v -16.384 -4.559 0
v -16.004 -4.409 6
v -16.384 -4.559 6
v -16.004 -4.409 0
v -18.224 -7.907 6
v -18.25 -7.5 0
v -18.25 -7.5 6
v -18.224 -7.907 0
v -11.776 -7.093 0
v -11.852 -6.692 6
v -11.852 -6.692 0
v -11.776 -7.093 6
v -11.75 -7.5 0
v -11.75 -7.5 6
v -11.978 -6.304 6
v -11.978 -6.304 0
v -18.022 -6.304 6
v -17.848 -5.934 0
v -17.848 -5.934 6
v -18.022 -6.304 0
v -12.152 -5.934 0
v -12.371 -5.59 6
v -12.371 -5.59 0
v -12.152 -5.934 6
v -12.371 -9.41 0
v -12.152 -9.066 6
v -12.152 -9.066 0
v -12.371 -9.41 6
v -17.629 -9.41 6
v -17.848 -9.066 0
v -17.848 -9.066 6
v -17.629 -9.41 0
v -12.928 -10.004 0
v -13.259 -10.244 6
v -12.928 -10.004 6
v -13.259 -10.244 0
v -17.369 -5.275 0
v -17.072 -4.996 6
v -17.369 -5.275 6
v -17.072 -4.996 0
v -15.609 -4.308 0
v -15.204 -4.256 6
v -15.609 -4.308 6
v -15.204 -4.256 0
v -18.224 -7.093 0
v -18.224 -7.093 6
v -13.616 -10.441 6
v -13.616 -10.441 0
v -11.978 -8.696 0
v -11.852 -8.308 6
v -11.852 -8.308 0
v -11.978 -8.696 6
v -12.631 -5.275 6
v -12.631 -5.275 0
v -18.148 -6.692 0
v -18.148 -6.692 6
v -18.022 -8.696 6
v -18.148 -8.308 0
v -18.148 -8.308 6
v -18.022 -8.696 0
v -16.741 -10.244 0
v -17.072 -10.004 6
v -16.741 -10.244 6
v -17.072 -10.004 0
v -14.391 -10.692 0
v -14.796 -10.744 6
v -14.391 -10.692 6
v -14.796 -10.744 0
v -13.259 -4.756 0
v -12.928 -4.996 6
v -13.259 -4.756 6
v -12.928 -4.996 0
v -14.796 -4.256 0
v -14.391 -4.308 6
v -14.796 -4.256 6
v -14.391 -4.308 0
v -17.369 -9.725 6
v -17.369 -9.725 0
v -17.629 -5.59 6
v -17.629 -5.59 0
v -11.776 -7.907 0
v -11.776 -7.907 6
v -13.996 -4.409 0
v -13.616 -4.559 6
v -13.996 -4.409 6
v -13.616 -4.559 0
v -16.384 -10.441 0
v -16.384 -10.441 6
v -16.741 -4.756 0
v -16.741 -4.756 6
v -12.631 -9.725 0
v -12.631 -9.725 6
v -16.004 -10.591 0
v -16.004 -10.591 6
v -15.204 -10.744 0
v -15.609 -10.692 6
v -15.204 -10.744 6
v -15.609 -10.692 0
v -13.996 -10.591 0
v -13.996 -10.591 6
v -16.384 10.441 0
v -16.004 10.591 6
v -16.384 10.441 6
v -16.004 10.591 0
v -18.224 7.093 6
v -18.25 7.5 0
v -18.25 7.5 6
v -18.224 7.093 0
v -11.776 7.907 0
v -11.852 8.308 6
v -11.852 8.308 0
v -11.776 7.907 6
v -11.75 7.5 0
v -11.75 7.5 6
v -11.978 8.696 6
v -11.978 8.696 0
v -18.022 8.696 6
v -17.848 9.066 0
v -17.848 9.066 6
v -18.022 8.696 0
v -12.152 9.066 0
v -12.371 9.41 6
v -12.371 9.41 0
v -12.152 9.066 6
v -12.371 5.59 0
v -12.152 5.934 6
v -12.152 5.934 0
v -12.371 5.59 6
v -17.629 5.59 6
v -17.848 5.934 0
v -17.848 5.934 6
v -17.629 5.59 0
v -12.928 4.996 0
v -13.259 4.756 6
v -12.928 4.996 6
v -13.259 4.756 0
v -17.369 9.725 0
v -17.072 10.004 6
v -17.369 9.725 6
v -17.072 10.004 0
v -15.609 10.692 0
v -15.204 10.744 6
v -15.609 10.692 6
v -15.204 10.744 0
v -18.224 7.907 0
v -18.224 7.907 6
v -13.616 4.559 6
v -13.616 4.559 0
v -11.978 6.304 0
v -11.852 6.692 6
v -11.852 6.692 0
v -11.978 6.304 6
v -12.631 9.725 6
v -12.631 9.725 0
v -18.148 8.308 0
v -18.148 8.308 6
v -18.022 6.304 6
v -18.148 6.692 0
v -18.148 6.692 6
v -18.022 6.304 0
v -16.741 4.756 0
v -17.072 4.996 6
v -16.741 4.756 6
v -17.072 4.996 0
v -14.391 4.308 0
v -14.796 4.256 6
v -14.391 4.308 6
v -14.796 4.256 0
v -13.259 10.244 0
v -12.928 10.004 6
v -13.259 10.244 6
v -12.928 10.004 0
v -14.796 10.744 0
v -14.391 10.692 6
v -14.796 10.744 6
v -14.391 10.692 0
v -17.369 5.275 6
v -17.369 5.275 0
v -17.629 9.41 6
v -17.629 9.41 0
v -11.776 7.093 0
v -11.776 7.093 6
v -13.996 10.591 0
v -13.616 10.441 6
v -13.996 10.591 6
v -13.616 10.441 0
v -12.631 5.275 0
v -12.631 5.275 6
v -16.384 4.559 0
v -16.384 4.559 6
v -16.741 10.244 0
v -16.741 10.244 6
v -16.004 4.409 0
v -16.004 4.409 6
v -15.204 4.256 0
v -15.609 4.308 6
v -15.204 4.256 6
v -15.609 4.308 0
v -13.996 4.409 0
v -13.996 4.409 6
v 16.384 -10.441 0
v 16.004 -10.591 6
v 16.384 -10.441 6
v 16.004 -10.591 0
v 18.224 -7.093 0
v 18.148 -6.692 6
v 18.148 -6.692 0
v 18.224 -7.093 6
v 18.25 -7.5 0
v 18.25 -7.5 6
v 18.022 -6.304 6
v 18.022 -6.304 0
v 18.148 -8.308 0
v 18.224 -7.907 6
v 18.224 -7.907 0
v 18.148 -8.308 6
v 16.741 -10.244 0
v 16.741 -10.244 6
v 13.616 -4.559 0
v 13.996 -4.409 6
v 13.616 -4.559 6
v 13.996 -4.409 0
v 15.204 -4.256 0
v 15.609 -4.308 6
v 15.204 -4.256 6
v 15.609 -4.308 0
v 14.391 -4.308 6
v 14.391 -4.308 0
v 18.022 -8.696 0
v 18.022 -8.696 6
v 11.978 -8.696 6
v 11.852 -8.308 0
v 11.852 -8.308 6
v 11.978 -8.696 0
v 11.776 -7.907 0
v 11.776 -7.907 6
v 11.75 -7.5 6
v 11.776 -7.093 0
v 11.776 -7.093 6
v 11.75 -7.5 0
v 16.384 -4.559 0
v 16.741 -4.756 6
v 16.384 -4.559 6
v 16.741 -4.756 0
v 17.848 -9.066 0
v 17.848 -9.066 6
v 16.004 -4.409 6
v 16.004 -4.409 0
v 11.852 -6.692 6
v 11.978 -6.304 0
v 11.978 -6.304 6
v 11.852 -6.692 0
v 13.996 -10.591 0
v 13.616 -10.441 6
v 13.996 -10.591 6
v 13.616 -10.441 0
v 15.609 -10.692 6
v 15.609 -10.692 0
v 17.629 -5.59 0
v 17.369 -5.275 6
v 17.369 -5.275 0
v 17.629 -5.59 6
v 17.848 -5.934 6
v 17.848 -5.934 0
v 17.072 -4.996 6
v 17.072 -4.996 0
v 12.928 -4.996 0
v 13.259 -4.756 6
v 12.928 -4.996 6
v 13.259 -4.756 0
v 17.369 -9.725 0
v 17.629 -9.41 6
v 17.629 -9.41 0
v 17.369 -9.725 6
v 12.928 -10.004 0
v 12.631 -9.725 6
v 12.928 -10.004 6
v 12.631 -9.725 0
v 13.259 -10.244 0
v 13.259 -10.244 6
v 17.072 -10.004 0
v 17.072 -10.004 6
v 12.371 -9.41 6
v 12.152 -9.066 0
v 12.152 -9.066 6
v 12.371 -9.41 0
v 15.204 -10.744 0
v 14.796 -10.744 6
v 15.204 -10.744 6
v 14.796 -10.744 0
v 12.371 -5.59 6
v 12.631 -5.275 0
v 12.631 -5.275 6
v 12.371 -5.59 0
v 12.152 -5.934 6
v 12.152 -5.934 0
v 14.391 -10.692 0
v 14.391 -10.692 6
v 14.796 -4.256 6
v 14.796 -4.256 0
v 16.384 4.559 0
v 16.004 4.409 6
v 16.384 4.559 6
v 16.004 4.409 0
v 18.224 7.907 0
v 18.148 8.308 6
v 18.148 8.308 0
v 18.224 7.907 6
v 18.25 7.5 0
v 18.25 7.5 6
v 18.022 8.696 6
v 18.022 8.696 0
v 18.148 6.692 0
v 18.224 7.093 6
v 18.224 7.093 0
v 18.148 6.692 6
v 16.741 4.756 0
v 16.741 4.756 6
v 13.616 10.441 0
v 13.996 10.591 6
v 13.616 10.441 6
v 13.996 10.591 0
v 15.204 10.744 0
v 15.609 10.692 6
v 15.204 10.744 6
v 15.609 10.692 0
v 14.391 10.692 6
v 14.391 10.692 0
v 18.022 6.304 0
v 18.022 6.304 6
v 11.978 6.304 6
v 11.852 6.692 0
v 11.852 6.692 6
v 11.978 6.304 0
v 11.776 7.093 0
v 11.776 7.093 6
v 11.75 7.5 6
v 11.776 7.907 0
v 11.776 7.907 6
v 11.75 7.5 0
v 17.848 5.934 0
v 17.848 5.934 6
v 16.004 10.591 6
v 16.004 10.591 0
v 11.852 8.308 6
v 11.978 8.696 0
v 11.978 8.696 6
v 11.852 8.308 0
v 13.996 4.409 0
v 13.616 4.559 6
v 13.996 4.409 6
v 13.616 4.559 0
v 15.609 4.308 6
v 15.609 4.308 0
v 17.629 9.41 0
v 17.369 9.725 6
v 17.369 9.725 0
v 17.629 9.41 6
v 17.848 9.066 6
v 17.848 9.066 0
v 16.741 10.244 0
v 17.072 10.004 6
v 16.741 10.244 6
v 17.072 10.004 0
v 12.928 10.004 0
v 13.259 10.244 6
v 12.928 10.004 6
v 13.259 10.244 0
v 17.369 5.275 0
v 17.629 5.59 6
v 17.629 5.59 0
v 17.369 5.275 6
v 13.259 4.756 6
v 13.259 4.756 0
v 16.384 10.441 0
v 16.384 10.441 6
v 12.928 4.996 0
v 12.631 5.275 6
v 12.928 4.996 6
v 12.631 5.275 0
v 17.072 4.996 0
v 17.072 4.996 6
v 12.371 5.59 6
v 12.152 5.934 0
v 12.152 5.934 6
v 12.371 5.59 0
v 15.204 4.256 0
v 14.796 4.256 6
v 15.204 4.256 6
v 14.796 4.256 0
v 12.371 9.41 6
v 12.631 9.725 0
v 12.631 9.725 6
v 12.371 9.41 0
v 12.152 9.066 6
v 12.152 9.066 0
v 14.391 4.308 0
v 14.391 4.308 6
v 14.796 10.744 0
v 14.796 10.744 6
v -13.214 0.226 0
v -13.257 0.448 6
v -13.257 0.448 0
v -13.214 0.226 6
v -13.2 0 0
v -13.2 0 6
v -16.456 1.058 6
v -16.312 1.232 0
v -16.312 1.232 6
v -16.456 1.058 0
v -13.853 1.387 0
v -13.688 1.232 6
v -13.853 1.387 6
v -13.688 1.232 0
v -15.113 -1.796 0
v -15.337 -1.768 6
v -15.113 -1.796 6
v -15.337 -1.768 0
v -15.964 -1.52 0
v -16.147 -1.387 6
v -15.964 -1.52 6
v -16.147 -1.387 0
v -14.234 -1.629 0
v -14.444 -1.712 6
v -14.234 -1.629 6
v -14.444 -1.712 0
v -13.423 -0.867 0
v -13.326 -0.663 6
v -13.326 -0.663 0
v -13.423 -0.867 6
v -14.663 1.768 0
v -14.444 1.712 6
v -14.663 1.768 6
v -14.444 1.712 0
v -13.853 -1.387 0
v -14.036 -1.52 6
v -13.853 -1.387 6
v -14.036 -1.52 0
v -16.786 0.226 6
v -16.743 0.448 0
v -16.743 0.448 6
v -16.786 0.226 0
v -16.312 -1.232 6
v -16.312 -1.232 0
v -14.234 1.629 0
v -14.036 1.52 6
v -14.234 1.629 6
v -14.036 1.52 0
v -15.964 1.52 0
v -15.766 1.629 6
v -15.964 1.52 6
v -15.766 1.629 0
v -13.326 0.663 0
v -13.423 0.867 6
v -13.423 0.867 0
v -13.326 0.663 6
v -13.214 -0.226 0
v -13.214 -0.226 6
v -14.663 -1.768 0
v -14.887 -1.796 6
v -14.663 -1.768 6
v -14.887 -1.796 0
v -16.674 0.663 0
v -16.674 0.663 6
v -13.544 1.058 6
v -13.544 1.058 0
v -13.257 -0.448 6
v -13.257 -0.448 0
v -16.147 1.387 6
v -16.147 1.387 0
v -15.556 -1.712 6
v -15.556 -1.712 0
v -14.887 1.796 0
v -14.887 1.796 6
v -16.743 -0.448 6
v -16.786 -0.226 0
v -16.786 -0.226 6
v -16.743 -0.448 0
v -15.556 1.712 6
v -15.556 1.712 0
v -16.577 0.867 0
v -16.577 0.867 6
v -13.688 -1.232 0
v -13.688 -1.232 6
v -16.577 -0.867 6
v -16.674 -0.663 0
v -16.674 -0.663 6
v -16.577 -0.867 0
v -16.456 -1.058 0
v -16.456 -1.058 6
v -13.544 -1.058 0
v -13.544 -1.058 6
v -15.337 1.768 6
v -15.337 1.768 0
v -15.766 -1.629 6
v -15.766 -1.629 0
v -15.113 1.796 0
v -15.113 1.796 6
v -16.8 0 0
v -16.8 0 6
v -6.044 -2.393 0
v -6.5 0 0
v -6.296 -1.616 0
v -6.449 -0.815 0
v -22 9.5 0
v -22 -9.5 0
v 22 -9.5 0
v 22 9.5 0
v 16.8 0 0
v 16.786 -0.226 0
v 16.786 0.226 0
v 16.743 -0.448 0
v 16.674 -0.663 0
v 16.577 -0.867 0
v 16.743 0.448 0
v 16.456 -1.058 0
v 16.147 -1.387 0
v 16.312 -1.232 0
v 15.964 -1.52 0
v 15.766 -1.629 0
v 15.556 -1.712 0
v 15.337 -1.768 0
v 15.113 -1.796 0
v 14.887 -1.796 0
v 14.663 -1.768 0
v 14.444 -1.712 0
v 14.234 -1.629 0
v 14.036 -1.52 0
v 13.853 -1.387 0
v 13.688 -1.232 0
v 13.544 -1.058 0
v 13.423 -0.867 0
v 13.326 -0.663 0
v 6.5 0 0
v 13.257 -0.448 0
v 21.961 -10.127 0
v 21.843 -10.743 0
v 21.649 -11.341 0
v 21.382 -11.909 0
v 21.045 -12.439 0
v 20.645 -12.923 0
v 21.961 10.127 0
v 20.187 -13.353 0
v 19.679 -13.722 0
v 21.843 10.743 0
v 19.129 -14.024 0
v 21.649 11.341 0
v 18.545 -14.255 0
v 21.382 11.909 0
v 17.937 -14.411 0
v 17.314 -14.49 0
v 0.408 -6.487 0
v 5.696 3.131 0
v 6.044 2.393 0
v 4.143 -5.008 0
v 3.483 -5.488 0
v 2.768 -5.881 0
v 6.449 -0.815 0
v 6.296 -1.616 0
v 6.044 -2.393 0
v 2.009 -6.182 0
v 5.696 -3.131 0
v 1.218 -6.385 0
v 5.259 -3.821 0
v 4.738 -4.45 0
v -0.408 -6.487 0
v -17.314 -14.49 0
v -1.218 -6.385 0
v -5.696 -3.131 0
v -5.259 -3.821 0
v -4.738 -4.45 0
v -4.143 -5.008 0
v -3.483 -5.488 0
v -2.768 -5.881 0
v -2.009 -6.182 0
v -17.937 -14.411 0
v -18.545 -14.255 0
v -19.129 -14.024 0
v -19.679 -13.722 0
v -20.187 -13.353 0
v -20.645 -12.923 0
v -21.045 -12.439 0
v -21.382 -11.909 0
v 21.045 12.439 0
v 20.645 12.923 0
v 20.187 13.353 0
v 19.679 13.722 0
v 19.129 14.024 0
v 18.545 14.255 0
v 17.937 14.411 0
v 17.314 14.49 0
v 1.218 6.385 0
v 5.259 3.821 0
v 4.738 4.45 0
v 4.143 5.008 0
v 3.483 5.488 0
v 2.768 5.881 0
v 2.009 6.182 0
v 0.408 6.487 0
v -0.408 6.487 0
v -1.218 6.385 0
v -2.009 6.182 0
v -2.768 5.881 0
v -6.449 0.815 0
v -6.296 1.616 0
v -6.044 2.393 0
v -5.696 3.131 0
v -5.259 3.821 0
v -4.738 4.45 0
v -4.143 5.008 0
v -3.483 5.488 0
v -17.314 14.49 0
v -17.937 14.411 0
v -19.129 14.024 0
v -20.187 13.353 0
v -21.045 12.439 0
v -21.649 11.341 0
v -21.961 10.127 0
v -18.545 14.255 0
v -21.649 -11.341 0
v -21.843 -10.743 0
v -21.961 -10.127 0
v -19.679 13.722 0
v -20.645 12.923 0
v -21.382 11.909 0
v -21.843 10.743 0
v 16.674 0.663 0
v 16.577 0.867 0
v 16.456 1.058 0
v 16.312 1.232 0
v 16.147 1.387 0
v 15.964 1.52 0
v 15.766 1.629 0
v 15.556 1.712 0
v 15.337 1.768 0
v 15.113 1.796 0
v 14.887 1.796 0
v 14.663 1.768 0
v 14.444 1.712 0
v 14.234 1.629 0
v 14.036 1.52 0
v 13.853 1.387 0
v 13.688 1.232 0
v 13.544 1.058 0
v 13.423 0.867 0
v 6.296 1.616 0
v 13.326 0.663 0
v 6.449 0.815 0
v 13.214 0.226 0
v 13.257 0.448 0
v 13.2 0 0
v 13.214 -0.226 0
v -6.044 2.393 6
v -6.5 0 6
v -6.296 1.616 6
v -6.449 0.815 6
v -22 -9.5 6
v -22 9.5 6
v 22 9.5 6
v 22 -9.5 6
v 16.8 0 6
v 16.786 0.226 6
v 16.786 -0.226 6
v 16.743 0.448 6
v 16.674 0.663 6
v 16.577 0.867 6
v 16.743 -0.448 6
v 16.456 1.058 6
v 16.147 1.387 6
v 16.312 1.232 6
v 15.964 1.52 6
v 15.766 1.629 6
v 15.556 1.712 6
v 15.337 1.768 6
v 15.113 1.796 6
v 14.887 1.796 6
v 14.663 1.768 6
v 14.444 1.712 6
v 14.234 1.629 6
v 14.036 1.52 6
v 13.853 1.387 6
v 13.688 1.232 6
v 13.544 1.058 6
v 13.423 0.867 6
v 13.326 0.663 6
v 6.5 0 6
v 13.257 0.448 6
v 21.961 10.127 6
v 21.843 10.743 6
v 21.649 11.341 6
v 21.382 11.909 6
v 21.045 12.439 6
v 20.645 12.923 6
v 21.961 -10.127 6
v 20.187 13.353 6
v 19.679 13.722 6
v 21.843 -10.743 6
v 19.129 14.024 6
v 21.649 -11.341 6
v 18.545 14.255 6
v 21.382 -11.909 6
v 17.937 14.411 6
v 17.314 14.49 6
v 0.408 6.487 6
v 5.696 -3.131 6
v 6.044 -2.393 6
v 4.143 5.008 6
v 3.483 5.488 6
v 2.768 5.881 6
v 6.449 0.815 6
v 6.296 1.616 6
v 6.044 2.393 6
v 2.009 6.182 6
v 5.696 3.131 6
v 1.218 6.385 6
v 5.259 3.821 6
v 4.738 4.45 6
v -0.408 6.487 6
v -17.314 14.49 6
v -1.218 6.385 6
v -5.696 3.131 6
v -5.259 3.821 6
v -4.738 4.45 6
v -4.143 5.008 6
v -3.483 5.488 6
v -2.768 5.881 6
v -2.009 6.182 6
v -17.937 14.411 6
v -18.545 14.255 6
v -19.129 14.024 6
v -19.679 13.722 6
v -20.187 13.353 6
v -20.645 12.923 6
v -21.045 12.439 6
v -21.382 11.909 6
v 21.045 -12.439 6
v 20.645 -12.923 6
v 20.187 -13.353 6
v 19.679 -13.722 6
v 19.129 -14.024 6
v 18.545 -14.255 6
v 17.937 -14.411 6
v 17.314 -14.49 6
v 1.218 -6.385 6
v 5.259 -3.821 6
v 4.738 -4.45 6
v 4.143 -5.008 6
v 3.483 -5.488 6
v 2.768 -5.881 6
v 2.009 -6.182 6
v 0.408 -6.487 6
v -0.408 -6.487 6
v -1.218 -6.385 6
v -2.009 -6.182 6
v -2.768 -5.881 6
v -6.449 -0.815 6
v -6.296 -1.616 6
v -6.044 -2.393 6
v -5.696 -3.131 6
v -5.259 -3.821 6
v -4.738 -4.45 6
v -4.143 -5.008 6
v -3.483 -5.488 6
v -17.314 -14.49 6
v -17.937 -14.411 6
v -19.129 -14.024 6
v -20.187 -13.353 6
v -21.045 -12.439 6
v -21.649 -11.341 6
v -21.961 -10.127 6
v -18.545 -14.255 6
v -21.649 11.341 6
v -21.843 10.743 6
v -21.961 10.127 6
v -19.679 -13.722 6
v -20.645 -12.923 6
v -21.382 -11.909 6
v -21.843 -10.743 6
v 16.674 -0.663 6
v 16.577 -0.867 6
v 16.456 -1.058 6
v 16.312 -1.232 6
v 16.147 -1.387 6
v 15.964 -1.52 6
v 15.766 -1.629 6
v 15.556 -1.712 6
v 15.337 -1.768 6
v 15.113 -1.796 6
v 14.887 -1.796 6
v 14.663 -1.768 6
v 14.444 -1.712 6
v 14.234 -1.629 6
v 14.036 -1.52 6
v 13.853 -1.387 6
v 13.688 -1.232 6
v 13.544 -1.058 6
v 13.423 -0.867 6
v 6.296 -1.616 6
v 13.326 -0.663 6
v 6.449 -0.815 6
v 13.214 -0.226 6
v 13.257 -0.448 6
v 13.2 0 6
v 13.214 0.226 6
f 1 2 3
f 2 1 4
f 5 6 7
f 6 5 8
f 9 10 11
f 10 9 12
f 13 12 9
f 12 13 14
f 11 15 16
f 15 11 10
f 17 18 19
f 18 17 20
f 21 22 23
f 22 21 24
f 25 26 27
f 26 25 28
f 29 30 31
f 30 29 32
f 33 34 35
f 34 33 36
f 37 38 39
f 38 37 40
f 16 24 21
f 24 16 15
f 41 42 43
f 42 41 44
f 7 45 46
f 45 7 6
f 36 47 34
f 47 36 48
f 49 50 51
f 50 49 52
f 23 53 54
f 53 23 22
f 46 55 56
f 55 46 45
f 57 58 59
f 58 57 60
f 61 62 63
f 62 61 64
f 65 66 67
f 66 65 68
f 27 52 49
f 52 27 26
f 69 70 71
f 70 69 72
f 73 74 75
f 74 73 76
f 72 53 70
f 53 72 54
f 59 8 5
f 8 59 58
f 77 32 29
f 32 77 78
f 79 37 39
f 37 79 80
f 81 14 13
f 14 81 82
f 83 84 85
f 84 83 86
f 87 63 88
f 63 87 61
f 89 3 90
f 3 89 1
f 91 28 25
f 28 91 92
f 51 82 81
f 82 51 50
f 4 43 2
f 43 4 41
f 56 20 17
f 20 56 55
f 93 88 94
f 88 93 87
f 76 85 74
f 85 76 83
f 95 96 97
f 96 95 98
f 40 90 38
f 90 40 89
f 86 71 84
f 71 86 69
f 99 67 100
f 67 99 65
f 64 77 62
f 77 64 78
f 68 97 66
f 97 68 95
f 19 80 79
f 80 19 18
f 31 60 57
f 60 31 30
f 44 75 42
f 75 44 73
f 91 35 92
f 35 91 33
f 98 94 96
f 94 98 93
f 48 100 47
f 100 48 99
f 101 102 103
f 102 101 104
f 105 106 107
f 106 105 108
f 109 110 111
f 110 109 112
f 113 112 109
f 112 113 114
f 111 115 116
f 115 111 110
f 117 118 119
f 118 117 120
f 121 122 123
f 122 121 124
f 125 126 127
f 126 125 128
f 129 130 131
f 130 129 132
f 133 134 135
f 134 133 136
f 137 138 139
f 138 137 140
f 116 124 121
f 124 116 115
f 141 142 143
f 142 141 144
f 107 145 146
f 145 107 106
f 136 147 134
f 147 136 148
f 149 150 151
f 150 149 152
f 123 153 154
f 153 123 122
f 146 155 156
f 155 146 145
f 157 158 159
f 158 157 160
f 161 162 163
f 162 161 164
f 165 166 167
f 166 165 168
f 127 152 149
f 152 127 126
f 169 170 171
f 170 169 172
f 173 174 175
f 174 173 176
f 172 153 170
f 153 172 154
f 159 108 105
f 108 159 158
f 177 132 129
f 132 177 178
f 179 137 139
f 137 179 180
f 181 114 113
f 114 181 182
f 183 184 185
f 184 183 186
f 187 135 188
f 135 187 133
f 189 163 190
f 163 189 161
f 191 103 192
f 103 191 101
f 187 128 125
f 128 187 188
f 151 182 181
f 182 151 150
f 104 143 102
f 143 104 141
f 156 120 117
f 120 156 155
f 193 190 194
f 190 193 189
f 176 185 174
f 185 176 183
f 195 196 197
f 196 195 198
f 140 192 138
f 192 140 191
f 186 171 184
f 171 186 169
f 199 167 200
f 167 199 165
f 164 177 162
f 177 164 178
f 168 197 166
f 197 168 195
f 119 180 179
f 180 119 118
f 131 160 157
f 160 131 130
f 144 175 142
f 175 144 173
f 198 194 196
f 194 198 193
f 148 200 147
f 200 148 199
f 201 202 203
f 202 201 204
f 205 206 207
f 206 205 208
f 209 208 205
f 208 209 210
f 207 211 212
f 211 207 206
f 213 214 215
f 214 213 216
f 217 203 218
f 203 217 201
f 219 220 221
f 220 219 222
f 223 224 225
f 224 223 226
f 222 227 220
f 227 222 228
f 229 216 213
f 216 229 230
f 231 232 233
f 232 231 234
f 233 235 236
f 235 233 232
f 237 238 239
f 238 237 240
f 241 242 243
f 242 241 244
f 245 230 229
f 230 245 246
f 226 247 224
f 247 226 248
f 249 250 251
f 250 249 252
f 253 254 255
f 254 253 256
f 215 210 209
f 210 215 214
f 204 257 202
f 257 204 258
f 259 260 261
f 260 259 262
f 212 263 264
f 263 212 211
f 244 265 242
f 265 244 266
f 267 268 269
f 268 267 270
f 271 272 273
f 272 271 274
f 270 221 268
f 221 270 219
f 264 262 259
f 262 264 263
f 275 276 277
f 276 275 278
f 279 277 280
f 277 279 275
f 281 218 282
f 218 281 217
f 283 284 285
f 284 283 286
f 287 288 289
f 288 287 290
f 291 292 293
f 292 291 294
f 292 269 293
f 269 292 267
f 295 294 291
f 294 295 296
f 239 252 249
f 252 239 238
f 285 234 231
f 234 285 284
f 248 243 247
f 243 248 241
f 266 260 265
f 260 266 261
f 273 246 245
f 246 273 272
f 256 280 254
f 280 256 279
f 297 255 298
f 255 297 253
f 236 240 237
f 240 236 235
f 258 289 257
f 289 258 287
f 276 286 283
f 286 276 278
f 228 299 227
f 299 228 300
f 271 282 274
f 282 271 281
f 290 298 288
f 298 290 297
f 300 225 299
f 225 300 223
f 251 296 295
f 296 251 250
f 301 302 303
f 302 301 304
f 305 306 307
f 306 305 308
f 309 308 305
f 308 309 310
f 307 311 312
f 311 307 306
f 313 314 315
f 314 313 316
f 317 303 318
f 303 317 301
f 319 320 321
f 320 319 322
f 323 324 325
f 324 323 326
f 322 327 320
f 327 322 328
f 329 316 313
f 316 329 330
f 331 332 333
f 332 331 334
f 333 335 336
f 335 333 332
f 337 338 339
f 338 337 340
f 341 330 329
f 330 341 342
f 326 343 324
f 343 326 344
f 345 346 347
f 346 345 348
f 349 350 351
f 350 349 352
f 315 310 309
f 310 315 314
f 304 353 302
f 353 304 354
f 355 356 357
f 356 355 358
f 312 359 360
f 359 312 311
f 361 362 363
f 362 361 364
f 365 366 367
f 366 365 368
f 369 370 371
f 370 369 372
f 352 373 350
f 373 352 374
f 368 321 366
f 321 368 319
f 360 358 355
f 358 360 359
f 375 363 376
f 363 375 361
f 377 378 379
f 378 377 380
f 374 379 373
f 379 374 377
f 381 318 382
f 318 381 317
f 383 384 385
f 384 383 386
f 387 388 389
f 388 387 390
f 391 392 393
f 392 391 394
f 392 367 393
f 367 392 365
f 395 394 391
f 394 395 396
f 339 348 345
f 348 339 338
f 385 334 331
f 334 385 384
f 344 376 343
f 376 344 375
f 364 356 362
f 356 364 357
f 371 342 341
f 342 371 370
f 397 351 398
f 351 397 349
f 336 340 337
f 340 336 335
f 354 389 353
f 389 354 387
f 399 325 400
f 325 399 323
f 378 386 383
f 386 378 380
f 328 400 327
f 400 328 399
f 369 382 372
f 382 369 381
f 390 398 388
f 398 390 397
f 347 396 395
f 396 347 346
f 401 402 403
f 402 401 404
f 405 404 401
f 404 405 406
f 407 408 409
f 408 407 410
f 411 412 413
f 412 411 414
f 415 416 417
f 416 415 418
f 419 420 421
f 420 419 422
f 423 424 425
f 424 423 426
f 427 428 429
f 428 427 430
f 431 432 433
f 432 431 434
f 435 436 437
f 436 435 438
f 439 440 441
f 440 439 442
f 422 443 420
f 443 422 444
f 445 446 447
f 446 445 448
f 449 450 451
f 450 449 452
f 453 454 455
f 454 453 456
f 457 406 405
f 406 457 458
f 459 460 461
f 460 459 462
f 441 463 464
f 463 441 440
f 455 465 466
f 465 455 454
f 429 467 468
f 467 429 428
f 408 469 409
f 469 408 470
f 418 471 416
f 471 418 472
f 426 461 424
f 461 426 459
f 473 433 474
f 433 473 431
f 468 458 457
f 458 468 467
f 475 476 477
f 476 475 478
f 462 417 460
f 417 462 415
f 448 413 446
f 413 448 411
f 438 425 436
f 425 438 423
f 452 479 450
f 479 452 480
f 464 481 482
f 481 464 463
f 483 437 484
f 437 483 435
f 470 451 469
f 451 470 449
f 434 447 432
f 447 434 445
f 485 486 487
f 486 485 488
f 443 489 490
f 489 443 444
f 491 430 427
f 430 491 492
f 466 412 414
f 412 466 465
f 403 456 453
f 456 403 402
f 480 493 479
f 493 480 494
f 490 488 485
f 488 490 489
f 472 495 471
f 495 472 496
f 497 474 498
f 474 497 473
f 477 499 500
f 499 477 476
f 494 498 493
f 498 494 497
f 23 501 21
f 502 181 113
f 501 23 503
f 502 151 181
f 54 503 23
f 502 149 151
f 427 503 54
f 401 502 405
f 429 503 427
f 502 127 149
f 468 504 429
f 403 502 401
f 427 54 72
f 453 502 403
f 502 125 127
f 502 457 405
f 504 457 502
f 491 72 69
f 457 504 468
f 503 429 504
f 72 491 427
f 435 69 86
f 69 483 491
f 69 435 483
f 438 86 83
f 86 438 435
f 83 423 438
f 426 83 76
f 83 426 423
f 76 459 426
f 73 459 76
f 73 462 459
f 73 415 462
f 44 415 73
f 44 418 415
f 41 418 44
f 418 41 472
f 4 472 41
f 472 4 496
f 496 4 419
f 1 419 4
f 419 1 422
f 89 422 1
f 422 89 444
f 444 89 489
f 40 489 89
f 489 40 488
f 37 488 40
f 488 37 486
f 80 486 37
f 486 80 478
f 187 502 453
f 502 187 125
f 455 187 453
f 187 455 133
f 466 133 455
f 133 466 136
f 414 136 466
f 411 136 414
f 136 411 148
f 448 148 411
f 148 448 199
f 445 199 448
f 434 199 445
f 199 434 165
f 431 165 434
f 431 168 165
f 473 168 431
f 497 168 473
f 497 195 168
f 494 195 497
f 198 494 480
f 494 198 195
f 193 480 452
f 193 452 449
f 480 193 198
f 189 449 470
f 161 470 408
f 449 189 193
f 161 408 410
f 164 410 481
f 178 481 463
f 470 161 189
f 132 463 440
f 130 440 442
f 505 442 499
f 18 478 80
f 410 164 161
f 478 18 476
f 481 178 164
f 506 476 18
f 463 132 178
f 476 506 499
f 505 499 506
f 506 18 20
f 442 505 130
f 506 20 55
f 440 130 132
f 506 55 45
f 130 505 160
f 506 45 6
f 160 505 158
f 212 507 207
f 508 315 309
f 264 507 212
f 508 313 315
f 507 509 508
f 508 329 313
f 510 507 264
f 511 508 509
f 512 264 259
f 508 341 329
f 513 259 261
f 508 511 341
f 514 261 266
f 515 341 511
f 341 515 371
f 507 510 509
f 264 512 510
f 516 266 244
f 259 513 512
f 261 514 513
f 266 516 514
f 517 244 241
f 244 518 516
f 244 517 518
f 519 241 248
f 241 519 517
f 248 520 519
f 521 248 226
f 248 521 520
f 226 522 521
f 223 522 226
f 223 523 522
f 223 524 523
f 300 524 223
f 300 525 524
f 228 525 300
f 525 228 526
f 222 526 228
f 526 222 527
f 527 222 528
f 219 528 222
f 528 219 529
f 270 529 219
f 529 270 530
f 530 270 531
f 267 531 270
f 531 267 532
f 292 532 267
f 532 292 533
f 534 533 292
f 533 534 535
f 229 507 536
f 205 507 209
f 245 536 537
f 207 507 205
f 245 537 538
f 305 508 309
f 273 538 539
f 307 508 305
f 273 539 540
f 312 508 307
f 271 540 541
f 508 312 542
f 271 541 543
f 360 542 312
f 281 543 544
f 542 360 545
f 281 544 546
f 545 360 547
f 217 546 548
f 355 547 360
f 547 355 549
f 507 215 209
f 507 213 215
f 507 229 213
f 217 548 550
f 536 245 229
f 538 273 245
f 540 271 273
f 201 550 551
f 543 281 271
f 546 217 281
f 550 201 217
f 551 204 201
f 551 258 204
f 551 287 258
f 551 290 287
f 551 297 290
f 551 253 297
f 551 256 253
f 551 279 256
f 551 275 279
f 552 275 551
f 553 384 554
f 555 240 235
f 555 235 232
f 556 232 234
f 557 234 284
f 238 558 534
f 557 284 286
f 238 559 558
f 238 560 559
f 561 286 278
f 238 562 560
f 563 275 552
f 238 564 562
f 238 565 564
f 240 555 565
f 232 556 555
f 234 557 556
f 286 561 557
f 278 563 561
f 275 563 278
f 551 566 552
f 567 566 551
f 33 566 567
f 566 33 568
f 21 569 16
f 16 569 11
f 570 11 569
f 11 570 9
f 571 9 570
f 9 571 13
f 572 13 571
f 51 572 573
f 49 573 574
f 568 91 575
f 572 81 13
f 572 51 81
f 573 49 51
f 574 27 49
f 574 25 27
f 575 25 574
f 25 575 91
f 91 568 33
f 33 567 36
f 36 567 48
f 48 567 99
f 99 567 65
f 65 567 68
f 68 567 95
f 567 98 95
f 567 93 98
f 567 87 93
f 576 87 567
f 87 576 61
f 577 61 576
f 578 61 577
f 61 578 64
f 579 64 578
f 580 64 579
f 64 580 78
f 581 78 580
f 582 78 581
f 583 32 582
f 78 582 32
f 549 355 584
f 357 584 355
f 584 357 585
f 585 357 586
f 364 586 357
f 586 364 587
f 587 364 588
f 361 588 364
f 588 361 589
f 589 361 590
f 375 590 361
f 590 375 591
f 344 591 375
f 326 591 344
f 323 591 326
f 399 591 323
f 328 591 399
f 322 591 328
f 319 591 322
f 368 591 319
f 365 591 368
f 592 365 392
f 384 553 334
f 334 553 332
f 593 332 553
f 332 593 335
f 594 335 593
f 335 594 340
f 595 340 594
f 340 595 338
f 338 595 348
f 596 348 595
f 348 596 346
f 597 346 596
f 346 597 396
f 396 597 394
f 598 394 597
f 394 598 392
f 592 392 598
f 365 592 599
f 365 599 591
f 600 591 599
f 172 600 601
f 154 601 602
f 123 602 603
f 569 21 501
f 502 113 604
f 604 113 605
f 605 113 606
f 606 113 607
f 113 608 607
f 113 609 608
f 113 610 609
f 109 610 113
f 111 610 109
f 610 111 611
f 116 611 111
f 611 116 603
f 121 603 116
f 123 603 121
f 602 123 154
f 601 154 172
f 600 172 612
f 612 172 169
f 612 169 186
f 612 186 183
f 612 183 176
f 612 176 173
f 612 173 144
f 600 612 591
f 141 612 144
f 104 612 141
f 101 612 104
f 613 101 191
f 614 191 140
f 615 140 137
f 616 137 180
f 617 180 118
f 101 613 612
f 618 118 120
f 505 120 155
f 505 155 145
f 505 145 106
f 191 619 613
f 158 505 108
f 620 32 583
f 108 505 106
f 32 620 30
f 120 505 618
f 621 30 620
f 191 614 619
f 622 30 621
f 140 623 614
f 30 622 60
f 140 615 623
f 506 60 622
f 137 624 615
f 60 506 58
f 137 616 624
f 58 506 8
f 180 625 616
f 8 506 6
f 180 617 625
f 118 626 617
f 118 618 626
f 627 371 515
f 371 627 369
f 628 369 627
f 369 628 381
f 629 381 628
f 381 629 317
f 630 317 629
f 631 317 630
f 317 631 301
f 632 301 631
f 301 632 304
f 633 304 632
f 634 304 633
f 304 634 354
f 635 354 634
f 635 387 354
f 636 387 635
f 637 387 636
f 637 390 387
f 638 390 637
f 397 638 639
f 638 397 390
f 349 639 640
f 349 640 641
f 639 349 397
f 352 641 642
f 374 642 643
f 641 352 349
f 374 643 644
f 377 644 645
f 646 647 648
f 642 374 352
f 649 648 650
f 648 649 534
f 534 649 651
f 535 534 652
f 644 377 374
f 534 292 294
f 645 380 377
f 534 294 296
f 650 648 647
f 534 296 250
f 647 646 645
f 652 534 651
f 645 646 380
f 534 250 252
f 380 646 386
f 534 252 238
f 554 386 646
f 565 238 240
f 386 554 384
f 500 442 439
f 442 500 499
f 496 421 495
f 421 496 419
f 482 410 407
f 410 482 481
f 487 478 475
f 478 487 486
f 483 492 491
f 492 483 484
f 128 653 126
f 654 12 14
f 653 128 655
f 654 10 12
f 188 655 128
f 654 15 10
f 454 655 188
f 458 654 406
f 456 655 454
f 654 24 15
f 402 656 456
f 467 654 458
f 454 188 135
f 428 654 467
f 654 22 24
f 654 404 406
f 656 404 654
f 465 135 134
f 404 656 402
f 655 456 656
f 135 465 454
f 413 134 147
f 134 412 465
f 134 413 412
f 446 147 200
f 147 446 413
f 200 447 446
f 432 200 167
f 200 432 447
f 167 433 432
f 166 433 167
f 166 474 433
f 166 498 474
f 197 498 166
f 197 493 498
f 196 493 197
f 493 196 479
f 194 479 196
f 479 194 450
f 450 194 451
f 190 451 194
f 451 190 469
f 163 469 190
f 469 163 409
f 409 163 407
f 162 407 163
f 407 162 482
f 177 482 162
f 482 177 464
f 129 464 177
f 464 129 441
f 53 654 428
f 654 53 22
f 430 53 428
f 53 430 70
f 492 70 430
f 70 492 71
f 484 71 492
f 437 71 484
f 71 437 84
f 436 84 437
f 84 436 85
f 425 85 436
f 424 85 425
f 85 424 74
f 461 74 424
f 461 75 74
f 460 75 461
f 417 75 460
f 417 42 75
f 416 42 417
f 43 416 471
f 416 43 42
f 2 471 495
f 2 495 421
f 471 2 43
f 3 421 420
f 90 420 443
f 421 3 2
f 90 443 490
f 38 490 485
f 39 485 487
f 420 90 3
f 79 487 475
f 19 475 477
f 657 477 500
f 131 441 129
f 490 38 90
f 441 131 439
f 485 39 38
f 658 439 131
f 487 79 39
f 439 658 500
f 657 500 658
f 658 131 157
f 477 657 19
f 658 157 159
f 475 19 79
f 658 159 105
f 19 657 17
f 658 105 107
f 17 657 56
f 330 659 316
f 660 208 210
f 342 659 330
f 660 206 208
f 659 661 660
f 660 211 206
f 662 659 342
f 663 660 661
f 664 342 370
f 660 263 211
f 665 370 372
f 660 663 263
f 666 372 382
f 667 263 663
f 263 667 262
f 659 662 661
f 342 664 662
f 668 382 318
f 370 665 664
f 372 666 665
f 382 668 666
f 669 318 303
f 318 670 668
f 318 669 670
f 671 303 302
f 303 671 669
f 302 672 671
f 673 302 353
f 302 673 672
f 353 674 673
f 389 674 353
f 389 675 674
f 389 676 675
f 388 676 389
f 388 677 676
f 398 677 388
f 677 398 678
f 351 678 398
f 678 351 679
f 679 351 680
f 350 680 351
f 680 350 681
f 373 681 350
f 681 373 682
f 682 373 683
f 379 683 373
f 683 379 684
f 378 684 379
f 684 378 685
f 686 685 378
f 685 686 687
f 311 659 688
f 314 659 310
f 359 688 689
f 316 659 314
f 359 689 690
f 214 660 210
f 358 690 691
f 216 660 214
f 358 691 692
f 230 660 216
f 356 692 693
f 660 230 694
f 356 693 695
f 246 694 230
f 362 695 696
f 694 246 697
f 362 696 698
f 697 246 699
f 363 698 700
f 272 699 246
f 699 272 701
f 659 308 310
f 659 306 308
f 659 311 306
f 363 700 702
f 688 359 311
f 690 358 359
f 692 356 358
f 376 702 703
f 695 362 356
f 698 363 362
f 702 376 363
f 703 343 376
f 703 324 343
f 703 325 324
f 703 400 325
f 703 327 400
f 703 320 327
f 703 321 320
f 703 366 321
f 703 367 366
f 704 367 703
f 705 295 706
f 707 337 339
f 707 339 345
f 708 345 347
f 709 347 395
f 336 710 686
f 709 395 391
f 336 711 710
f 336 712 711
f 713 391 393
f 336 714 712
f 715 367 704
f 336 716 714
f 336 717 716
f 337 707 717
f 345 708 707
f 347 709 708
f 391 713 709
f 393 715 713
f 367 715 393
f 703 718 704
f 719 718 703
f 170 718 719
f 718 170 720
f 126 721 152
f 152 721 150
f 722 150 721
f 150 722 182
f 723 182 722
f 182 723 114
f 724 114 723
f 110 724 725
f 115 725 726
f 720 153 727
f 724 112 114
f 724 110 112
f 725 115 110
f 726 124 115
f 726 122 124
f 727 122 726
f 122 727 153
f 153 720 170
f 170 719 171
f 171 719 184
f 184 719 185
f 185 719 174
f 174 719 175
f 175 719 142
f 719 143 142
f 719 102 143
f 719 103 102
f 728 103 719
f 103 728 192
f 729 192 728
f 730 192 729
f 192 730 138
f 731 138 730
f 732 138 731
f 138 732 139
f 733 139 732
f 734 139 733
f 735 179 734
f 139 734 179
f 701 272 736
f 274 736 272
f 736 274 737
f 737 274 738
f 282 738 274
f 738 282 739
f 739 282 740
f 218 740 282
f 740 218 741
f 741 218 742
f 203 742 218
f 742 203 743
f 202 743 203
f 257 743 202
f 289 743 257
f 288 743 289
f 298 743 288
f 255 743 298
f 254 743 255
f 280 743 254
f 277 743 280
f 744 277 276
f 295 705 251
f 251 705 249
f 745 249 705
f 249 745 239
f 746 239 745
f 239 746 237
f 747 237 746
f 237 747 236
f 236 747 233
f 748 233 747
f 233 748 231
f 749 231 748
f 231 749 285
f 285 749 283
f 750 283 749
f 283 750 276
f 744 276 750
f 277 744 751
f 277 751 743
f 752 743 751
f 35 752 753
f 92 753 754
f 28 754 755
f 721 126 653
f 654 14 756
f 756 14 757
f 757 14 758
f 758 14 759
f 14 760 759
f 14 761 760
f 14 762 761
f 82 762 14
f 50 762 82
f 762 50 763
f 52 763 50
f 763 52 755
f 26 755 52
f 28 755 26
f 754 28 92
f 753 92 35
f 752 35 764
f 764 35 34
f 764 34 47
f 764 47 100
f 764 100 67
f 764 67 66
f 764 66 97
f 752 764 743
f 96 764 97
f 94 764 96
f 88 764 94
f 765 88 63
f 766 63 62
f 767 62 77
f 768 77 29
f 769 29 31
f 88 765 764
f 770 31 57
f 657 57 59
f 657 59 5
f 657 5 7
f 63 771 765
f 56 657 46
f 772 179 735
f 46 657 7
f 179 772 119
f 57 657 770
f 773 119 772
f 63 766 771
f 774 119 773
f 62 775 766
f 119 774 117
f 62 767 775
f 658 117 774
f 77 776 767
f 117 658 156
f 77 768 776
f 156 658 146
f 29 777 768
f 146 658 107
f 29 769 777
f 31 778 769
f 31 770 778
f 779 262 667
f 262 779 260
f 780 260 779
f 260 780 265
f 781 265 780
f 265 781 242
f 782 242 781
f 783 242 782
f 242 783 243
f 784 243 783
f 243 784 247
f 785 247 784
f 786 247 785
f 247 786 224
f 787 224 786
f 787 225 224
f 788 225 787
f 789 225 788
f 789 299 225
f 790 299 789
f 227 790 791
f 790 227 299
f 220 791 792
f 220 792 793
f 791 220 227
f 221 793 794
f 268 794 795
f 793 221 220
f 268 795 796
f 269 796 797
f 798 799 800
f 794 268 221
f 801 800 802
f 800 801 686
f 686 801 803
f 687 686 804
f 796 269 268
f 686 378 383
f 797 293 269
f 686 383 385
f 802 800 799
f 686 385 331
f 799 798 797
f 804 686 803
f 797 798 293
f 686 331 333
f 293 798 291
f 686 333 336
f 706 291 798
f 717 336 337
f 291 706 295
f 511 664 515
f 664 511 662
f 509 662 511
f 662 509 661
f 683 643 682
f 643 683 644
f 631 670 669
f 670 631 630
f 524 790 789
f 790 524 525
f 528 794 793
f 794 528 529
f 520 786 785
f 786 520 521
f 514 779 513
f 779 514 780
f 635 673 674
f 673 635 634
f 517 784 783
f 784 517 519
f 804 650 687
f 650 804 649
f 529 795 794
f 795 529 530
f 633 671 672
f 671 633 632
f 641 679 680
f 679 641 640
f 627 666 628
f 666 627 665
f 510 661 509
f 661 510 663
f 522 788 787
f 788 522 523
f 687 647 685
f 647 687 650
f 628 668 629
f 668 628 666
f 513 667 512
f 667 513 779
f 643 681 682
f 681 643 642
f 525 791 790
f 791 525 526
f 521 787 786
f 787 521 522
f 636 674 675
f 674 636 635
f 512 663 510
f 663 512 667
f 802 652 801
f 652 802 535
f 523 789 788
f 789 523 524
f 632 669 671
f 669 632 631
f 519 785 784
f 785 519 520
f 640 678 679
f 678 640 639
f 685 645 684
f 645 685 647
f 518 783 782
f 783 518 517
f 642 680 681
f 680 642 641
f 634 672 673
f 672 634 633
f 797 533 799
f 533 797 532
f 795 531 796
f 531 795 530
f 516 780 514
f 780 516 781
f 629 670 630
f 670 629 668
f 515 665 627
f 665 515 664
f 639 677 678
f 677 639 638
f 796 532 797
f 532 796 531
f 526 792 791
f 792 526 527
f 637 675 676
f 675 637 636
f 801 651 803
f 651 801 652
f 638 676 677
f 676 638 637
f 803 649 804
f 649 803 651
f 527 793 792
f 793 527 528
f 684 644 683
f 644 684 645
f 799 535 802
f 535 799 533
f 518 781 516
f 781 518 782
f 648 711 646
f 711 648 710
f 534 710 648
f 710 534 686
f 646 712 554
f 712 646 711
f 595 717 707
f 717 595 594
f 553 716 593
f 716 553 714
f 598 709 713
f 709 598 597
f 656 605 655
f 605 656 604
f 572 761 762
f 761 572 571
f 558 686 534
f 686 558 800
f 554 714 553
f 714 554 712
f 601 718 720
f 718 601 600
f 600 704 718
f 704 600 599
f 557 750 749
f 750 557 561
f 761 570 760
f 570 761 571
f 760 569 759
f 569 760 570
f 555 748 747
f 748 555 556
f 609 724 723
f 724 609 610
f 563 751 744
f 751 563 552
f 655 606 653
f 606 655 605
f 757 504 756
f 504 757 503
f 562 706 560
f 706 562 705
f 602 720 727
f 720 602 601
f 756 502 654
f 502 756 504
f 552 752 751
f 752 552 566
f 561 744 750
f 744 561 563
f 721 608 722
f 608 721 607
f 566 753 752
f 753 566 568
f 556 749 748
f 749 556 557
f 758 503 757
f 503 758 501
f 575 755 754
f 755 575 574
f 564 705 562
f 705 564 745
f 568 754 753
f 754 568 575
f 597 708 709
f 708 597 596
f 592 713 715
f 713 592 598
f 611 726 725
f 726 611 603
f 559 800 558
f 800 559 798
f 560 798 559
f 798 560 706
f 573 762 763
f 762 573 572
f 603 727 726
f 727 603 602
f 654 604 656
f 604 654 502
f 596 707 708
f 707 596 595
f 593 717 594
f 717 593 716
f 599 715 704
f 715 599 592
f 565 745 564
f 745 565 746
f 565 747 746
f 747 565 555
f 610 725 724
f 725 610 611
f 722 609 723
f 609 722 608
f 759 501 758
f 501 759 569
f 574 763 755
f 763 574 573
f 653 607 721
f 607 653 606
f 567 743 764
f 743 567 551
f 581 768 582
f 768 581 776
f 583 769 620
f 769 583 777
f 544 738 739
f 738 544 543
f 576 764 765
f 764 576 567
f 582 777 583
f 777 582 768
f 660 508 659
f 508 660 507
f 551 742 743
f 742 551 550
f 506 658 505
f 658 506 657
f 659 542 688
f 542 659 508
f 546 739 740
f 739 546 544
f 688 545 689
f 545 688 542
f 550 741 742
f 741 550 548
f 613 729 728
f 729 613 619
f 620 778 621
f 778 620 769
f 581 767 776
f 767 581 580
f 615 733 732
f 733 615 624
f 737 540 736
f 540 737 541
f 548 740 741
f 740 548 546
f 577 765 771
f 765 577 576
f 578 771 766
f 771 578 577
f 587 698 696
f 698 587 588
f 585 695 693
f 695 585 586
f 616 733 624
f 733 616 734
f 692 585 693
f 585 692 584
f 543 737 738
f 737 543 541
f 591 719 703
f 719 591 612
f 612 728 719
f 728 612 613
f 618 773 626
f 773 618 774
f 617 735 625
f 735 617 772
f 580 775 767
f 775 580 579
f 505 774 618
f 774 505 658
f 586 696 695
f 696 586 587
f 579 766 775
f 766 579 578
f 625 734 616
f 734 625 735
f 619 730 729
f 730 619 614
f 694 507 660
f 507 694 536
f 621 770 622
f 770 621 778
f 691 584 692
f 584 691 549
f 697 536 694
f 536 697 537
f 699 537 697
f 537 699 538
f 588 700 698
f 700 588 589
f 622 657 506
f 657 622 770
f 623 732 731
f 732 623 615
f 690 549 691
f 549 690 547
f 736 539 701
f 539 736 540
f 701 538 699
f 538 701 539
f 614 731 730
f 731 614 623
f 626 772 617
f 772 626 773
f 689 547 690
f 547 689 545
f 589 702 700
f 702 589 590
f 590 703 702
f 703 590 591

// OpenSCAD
$fn = 50;


difference() {
	union() {
		hull() {
			translate(v = [-17.0000000000, 9.5000000000, 0]) {
				cylinder(h = 6, r = 5);
			}
			translate(v = [17.0000000000, 9.5000000000, 0]) {
				cylinder(h = 6, r = 5);
			}
			translate(v = [-17.0000000000, -9.5000000000, 0]) {
				cylinder(h = 6, r = 5);
			}
			translate(v = [17.0000000000, -9.5000000000, 0]) {
				cylinder(h = 6, r = 5);
			}
		}
	}
	union() {
		#translate(v = [-15.0000000000, -7.5000000000, 0]) {
			cylinder(h = 6, r = 3.2500000000);
		}
		#translate(v = [-15.0000000000, 7.5000000000, 0]) {
			cylinder(h = 6, r = 3.2500000000);
		}
		#translate(v = [15.0000000000, -7.5000000000, 0]) {
			cylinder(h = 6, r = 3.2500000000);
		}
		#translate(v = [15.0000000000, 7.5000000000, 0]) {
			cylinder(h = 6, r = 3.2500000000);
		}
		#translate(v = [-15.0000000000, -7.5000000000, -100.0000000000]) {
			cylinder(h = 200, r = 3.2500000000);
		}
		#translate(v = [-15.0000000000, 7.5000000000, -100.0000000000]) {
			cylinder(h = 200, r = 3.2500000000);
		}
		#translate(v = [15.0000000000, -7.5000000000, -100.0000000000]) {
			cylinder(h = 200, r = 3.2500000000);
		}
		#translate(v = [15.0000000000, 7.5000000000, -100.0000000000]) {
			cylinder(h = 200, r = 3.2500000000);
		}
		#translate(v = [-15.0000000000, -7.5000000000, 0]) {
			cylinder(h = 6, r = 1.8000000000);
		}
		#translate(v = [-15.0000000000, 0.0000000000, 0]) {
			cylinder(h = 6, r = 1.8000000000);
		}
		#translate(v = [-15.0000000000, 7.5000000000, 0]) {
			cylinder(h = 6, r = 1.8000000000);
		}
		#translate(v = [15.0000000000, -7.5000000000, 0]) {
			cylinder(h = 6, r = 1.8000000000);
		}
		#translate(v = [15.0000000000, 0.0000000000, 0]) {
			cylinder(h = 6, r = 1.8000000000);
		}
		#translate(v = [15.0000000000, 7.5000000000, 0]) {
			cylinder(h = 6, r = 1.8000000000);
		}
		#translate(v = [-15.0000000000, -7.5000000000, 0]) {
			cylinder(h = 6, r = 1.8000000000);
		}
		#translate(v = [-15.0000000000, 0.0000000000, 0]) {
			cylinder(h = 6, r = 1.8000000000);
		}
		#translate(v = [-15.0000000000, 7.5000000000, 0]) {
			cylinder(h = 6, r = 1.8000000000);
		}
		#translate(v = [15.0000000000, -7.5000000000, 0]) {
			cylinder(h = 6, r = 1.8000000000);
		}
		#translate(v = [15.0000000000, 0.0000000000, 0]) {
			cylinder(h = 6, r = 1.8000000000);
		}
		#translate(v = [15.0000000000, 7.5000000000, 0]) {
			cylinder(h = 6, r = 1.8000000000);
		}
		#translate(v = [-15.0000000000, -7.5000000000, 0]) {
			cylinder(h = 6, r = 1.8000000000);
		}
		#translate(v = [-15.0000000000, 0.0000000000, 0]) {
			cylinder(h = 6, r = 1.8000000000);
		}
		#translate(v = [-15.0000000000, 7.5000000000, 0]) {
			cylinder(h = 6, r = 1.8000000000);
		}
		#translate(v = [15.0000000000, -7.5000000000, 0]) {
			cylinder(h = 6, r = 1.8000000000);
		}
		#translate(v = [15.0000000000, 0.0000000000, 0]) {
			cylinder(h = 6, r = 1.8000000000);
		}
		#translate(v = [15.0000000000, 7.5000000000, 0]) {
			cylinder(h = 6, r = 1.8000000000);
		}
		#cylinder(h = 6, r = 6.5000000000);
	}
}
